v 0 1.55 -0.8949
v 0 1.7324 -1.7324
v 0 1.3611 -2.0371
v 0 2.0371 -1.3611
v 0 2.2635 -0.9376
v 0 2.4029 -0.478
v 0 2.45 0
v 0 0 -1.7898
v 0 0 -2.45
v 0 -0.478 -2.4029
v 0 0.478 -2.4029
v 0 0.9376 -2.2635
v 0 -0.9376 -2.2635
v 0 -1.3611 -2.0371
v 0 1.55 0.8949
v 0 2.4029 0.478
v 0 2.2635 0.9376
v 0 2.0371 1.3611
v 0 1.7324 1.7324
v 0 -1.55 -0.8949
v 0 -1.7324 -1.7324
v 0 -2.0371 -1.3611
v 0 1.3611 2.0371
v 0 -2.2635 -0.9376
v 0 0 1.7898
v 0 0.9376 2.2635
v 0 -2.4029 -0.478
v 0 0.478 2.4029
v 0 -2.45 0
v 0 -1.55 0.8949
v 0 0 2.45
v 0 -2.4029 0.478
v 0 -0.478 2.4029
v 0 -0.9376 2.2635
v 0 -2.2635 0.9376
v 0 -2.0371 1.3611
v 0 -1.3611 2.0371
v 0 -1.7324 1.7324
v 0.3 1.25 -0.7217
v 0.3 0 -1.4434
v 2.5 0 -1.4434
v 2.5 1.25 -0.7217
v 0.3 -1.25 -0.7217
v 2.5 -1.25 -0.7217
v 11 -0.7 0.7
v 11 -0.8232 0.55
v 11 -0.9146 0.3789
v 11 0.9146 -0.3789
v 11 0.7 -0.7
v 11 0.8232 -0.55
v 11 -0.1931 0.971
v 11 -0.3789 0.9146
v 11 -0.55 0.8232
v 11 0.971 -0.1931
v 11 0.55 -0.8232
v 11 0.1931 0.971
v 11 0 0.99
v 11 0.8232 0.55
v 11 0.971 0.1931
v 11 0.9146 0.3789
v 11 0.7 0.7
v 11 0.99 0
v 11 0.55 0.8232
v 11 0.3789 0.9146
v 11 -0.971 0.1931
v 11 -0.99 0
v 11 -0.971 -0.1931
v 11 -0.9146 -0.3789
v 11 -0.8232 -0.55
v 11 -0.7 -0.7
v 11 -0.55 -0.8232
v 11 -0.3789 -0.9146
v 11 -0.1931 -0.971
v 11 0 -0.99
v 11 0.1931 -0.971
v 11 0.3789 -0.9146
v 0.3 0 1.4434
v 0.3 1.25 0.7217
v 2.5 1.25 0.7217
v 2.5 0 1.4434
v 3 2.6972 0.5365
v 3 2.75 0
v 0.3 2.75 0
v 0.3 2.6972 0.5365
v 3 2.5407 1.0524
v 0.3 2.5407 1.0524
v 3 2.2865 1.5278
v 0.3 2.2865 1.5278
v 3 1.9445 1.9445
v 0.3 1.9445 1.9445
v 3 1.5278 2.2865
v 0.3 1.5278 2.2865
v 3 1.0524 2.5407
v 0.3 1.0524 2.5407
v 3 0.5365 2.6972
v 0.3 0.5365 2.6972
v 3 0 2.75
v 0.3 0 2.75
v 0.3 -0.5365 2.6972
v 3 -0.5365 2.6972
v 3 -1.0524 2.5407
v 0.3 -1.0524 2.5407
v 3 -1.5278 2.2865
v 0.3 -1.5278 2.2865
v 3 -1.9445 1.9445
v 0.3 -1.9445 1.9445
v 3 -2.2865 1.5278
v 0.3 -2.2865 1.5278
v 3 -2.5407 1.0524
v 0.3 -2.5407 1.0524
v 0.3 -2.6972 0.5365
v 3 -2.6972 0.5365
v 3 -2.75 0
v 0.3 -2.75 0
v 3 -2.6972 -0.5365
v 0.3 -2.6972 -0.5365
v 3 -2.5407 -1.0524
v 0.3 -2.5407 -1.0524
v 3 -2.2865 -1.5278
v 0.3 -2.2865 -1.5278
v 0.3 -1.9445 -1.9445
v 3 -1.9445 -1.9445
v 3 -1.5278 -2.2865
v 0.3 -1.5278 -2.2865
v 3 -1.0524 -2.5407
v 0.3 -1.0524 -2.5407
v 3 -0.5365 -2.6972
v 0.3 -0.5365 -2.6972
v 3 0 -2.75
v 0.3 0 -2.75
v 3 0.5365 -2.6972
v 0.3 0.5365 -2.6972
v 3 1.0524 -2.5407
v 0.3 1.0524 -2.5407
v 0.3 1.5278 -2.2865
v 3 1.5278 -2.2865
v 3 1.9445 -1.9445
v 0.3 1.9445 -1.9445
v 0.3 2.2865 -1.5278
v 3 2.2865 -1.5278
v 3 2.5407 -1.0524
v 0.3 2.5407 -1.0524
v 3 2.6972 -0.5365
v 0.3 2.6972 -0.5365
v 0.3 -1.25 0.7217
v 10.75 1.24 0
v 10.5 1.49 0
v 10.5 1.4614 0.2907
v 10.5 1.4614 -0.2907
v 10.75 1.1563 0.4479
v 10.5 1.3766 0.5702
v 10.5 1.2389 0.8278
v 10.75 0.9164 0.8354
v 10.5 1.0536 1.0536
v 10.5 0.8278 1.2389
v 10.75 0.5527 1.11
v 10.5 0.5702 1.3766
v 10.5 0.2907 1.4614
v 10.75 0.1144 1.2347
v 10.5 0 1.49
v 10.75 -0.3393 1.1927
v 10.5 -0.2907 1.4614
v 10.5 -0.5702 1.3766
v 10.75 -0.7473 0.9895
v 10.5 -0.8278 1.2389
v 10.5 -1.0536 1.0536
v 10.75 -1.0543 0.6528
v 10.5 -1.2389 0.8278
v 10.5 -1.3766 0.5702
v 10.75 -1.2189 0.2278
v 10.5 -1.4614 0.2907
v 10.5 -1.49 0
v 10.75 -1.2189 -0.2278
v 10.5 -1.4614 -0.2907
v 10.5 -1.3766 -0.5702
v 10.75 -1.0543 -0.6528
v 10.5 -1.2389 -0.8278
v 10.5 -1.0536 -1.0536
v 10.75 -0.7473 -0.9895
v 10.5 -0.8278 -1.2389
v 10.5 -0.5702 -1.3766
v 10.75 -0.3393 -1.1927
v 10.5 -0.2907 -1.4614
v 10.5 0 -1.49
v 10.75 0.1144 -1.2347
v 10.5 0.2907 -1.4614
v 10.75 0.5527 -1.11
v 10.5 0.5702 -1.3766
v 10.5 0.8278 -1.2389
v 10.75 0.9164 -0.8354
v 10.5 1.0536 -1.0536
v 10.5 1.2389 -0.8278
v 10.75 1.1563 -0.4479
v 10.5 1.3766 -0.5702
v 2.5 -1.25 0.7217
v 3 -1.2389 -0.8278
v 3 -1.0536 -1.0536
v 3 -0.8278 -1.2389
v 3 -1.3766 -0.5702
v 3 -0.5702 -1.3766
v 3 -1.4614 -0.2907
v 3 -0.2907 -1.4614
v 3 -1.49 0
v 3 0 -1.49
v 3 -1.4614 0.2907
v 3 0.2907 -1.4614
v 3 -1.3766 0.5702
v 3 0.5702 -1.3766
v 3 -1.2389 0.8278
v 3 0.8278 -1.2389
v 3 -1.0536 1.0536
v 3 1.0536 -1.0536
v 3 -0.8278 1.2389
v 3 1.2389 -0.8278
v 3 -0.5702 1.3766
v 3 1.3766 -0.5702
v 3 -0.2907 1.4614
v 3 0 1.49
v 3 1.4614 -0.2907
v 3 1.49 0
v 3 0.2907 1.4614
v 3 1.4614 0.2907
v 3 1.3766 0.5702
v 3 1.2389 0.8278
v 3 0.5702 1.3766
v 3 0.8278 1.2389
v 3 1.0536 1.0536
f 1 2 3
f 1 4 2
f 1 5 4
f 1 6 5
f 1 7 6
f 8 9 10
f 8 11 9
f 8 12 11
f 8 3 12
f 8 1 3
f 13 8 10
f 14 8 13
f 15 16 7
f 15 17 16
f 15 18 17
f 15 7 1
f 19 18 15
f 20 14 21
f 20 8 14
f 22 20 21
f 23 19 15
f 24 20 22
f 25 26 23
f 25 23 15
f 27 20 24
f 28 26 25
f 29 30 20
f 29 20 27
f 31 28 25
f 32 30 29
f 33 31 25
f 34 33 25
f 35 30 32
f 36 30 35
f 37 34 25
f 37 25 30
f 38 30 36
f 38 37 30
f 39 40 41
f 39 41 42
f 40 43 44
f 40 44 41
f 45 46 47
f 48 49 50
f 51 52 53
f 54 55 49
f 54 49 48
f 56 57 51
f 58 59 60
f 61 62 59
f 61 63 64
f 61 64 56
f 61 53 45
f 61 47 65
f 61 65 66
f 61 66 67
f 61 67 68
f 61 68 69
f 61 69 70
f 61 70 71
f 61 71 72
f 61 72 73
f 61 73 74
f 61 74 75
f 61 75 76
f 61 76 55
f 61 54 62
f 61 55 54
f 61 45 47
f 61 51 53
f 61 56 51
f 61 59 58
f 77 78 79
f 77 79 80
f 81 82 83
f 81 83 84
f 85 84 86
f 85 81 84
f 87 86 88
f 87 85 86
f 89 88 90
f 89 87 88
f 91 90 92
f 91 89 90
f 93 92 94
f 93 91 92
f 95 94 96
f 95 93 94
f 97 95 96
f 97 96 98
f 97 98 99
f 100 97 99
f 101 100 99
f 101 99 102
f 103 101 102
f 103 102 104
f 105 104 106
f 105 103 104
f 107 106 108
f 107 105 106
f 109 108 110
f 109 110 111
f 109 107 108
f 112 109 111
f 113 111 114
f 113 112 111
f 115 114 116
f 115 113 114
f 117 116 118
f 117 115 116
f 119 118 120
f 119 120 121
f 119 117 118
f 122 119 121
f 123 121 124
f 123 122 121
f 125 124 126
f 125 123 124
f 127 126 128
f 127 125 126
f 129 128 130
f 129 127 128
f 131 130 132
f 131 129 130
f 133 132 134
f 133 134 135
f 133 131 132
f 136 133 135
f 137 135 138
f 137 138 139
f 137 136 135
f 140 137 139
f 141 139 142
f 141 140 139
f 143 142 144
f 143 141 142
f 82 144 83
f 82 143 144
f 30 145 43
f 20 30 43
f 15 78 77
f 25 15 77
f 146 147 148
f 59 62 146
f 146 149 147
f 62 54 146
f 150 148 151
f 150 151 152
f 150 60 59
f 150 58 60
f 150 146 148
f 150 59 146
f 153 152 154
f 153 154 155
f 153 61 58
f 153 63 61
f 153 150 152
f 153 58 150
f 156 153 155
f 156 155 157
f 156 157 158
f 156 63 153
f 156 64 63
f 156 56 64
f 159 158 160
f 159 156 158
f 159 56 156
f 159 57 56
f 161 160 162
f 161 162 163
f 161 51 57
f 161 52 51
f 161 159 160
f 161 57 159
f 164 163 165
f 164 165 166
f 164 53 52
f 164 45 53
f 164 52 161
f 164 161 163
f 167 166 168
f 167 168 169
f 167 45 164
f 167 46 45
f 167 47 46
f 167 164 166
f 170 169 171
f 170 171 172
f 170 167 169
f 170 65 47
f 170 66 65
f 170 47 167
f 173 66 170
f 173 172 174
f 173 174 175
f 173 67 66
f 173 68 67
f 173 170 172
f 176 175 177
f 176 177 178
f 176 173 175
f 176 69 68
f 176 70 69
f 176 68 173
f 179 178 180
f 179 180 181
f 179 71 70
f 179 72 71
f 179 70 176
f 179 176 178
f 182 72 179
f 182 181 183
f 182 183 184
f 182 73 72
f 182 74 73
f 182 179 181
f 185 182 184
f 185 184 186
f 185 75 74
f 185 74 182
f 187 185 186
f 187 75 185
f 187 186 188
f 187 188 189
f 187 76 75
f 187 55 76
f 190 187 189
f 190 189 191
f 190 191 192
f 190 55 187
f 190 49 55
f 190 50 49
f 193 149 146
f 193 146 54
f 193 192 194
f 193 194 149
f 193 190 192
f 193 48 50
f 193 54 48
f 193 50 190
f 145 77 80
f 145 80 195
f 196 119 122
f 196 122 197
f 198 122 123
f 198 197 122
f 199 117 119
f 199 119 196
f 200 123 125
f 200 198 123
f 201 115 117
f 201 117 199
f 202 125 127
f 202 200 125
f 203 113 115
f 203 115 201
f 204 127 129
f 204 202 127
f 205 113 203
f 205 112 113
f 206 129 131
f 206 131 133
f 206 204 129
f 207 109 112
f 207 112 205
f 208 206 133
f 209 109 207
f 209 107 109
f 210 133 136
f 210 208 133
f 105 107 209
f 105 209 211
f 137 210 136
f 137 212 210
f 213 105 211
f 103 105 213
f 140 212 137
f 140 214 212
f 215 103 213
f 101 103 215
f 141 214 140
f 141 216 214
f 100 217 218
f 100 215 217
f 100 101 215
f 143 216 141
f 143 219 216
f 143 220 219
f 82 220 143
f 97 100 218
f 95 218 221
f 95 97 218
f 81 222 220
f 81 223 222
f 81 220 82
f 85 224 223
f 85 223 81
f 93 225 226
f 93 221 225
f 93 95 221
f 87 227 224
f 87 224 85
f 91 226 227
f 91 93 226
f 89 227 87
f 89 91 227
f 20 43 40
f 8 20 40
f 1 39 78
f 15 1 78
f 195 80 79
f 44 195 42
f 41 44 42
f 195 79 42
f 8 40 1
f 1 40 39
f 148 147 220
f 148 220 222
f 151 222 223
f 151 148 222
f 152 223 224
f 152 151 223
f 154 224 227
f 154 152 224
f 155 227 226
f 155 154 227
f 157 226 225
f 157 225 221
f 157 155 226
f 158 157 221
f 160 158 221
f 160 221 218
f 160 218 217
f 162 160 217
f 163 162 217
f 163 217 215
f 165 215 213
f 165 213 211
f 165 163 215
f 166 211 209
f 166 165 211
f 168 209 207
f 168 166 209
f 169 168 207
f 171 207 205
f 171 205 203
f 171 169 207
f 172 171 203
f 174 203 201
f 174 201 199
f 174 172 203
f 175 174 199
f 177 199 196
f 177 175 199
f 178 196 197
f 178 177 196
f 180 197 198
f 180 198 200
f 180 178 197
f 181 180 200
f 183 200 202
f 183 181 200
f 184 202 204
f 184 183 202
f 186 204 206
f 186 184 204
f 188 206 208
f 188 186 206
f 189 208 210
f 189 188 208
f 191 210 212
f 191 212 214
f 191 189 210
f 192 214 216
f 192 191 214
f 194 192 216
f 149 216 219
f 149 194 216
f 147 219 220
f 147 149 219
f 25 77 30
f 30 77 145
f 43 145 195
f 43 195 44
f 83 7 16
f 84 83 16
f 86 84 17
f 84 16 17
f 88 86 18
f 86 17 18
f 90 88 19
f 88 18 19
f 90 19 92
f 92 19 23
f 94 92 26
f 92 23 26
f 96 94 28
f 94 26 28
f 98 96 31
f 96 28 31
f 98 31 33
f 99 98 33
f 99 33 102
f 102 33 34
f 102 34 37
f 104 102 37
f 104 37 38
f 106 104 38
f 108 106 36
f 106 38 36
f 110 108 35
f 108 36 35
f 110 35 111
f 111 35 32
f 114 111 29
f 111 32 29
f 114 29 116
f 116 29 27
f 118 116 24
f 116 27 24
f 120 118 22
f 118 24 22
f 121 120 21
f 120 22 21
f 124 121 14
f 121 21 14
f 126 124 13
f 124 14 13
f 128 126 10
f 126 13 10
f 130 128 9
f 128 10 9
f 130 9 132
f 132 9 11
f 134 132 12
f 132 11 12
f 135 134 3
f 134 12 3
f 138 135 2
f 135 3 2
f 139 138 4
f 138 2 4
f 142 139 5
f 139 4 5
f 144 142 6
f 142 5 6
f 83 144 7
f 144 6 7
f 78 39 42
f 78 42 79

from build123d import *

# Parameters (mm, degrees)
CHAMFER1_SIZE      = 0.5
CHAMFER2_SIZE      = 0.3
CUT_EXTRUDE1_DEPTH = 2.5
CHAMFER3_SIZE      = 0.3


with BuildPart() as part:
    # Sketch1 → Revolve1 (revolve)
    with BuildSketch(Plane.XY):
        Polygon((0, 0), (0, 2.75), (3, 2.75), (3, 1.49), (11, 1.49), (11, 0), align=None)
    revolve(axis=Axis((-88.705490849, 0, 0), (1, 0, 0)))

    # Chamfer1
    chamfer1_edges = [part.edges().sort_by_distance(p)[0] for p in [
        (11, -1.49, 0),
    ]]
    chamfer(chamfer1_edges, length=CHAMFER1_SIZE)

    # Chamfer2
    chamfer2_edges = [part.edges().sort_by_distance(p)[0] for p in [
        (0, -2.75, 0),
    ]]
    chamfer(chamfer2_edges, length=CHAMFER2_SIZE)

    # Sketch3 → Cut-Extrude1 (cut)
    with BuildSketch(Plane(origin=(0, 0, 0), x_dir=(0, 0, -1), z_dir=(1, 0, 0))):
        Polygon((-1.443375673, 0), (-0.721687836, -1.25), (0.721687836, -1.25), (1.443375673, 0), (0.721687836, 1.25), (-0.721687836, 1.25), align=None)
    extrude(amount=CUT_EXTRUDE1_DEPTH, mode=Mode.SUBTRACT)

    # Chamfer3
    chamfer3_edges = [part.edges().sort_by_distance(p)[0] for p in [
        (0, 0.625, 1.082531755),
        (0, -0.625, 1.082531755),
        (0, -1.25, 0),
        (0, -0.625, -1.082531755),
        (0, 0.625, -1.082531755),
        (0, 1.25, 0),
    ]]
    chamfer(chamfer3_edges, length=CHAMFER3_SIZE)


solid = part.part
